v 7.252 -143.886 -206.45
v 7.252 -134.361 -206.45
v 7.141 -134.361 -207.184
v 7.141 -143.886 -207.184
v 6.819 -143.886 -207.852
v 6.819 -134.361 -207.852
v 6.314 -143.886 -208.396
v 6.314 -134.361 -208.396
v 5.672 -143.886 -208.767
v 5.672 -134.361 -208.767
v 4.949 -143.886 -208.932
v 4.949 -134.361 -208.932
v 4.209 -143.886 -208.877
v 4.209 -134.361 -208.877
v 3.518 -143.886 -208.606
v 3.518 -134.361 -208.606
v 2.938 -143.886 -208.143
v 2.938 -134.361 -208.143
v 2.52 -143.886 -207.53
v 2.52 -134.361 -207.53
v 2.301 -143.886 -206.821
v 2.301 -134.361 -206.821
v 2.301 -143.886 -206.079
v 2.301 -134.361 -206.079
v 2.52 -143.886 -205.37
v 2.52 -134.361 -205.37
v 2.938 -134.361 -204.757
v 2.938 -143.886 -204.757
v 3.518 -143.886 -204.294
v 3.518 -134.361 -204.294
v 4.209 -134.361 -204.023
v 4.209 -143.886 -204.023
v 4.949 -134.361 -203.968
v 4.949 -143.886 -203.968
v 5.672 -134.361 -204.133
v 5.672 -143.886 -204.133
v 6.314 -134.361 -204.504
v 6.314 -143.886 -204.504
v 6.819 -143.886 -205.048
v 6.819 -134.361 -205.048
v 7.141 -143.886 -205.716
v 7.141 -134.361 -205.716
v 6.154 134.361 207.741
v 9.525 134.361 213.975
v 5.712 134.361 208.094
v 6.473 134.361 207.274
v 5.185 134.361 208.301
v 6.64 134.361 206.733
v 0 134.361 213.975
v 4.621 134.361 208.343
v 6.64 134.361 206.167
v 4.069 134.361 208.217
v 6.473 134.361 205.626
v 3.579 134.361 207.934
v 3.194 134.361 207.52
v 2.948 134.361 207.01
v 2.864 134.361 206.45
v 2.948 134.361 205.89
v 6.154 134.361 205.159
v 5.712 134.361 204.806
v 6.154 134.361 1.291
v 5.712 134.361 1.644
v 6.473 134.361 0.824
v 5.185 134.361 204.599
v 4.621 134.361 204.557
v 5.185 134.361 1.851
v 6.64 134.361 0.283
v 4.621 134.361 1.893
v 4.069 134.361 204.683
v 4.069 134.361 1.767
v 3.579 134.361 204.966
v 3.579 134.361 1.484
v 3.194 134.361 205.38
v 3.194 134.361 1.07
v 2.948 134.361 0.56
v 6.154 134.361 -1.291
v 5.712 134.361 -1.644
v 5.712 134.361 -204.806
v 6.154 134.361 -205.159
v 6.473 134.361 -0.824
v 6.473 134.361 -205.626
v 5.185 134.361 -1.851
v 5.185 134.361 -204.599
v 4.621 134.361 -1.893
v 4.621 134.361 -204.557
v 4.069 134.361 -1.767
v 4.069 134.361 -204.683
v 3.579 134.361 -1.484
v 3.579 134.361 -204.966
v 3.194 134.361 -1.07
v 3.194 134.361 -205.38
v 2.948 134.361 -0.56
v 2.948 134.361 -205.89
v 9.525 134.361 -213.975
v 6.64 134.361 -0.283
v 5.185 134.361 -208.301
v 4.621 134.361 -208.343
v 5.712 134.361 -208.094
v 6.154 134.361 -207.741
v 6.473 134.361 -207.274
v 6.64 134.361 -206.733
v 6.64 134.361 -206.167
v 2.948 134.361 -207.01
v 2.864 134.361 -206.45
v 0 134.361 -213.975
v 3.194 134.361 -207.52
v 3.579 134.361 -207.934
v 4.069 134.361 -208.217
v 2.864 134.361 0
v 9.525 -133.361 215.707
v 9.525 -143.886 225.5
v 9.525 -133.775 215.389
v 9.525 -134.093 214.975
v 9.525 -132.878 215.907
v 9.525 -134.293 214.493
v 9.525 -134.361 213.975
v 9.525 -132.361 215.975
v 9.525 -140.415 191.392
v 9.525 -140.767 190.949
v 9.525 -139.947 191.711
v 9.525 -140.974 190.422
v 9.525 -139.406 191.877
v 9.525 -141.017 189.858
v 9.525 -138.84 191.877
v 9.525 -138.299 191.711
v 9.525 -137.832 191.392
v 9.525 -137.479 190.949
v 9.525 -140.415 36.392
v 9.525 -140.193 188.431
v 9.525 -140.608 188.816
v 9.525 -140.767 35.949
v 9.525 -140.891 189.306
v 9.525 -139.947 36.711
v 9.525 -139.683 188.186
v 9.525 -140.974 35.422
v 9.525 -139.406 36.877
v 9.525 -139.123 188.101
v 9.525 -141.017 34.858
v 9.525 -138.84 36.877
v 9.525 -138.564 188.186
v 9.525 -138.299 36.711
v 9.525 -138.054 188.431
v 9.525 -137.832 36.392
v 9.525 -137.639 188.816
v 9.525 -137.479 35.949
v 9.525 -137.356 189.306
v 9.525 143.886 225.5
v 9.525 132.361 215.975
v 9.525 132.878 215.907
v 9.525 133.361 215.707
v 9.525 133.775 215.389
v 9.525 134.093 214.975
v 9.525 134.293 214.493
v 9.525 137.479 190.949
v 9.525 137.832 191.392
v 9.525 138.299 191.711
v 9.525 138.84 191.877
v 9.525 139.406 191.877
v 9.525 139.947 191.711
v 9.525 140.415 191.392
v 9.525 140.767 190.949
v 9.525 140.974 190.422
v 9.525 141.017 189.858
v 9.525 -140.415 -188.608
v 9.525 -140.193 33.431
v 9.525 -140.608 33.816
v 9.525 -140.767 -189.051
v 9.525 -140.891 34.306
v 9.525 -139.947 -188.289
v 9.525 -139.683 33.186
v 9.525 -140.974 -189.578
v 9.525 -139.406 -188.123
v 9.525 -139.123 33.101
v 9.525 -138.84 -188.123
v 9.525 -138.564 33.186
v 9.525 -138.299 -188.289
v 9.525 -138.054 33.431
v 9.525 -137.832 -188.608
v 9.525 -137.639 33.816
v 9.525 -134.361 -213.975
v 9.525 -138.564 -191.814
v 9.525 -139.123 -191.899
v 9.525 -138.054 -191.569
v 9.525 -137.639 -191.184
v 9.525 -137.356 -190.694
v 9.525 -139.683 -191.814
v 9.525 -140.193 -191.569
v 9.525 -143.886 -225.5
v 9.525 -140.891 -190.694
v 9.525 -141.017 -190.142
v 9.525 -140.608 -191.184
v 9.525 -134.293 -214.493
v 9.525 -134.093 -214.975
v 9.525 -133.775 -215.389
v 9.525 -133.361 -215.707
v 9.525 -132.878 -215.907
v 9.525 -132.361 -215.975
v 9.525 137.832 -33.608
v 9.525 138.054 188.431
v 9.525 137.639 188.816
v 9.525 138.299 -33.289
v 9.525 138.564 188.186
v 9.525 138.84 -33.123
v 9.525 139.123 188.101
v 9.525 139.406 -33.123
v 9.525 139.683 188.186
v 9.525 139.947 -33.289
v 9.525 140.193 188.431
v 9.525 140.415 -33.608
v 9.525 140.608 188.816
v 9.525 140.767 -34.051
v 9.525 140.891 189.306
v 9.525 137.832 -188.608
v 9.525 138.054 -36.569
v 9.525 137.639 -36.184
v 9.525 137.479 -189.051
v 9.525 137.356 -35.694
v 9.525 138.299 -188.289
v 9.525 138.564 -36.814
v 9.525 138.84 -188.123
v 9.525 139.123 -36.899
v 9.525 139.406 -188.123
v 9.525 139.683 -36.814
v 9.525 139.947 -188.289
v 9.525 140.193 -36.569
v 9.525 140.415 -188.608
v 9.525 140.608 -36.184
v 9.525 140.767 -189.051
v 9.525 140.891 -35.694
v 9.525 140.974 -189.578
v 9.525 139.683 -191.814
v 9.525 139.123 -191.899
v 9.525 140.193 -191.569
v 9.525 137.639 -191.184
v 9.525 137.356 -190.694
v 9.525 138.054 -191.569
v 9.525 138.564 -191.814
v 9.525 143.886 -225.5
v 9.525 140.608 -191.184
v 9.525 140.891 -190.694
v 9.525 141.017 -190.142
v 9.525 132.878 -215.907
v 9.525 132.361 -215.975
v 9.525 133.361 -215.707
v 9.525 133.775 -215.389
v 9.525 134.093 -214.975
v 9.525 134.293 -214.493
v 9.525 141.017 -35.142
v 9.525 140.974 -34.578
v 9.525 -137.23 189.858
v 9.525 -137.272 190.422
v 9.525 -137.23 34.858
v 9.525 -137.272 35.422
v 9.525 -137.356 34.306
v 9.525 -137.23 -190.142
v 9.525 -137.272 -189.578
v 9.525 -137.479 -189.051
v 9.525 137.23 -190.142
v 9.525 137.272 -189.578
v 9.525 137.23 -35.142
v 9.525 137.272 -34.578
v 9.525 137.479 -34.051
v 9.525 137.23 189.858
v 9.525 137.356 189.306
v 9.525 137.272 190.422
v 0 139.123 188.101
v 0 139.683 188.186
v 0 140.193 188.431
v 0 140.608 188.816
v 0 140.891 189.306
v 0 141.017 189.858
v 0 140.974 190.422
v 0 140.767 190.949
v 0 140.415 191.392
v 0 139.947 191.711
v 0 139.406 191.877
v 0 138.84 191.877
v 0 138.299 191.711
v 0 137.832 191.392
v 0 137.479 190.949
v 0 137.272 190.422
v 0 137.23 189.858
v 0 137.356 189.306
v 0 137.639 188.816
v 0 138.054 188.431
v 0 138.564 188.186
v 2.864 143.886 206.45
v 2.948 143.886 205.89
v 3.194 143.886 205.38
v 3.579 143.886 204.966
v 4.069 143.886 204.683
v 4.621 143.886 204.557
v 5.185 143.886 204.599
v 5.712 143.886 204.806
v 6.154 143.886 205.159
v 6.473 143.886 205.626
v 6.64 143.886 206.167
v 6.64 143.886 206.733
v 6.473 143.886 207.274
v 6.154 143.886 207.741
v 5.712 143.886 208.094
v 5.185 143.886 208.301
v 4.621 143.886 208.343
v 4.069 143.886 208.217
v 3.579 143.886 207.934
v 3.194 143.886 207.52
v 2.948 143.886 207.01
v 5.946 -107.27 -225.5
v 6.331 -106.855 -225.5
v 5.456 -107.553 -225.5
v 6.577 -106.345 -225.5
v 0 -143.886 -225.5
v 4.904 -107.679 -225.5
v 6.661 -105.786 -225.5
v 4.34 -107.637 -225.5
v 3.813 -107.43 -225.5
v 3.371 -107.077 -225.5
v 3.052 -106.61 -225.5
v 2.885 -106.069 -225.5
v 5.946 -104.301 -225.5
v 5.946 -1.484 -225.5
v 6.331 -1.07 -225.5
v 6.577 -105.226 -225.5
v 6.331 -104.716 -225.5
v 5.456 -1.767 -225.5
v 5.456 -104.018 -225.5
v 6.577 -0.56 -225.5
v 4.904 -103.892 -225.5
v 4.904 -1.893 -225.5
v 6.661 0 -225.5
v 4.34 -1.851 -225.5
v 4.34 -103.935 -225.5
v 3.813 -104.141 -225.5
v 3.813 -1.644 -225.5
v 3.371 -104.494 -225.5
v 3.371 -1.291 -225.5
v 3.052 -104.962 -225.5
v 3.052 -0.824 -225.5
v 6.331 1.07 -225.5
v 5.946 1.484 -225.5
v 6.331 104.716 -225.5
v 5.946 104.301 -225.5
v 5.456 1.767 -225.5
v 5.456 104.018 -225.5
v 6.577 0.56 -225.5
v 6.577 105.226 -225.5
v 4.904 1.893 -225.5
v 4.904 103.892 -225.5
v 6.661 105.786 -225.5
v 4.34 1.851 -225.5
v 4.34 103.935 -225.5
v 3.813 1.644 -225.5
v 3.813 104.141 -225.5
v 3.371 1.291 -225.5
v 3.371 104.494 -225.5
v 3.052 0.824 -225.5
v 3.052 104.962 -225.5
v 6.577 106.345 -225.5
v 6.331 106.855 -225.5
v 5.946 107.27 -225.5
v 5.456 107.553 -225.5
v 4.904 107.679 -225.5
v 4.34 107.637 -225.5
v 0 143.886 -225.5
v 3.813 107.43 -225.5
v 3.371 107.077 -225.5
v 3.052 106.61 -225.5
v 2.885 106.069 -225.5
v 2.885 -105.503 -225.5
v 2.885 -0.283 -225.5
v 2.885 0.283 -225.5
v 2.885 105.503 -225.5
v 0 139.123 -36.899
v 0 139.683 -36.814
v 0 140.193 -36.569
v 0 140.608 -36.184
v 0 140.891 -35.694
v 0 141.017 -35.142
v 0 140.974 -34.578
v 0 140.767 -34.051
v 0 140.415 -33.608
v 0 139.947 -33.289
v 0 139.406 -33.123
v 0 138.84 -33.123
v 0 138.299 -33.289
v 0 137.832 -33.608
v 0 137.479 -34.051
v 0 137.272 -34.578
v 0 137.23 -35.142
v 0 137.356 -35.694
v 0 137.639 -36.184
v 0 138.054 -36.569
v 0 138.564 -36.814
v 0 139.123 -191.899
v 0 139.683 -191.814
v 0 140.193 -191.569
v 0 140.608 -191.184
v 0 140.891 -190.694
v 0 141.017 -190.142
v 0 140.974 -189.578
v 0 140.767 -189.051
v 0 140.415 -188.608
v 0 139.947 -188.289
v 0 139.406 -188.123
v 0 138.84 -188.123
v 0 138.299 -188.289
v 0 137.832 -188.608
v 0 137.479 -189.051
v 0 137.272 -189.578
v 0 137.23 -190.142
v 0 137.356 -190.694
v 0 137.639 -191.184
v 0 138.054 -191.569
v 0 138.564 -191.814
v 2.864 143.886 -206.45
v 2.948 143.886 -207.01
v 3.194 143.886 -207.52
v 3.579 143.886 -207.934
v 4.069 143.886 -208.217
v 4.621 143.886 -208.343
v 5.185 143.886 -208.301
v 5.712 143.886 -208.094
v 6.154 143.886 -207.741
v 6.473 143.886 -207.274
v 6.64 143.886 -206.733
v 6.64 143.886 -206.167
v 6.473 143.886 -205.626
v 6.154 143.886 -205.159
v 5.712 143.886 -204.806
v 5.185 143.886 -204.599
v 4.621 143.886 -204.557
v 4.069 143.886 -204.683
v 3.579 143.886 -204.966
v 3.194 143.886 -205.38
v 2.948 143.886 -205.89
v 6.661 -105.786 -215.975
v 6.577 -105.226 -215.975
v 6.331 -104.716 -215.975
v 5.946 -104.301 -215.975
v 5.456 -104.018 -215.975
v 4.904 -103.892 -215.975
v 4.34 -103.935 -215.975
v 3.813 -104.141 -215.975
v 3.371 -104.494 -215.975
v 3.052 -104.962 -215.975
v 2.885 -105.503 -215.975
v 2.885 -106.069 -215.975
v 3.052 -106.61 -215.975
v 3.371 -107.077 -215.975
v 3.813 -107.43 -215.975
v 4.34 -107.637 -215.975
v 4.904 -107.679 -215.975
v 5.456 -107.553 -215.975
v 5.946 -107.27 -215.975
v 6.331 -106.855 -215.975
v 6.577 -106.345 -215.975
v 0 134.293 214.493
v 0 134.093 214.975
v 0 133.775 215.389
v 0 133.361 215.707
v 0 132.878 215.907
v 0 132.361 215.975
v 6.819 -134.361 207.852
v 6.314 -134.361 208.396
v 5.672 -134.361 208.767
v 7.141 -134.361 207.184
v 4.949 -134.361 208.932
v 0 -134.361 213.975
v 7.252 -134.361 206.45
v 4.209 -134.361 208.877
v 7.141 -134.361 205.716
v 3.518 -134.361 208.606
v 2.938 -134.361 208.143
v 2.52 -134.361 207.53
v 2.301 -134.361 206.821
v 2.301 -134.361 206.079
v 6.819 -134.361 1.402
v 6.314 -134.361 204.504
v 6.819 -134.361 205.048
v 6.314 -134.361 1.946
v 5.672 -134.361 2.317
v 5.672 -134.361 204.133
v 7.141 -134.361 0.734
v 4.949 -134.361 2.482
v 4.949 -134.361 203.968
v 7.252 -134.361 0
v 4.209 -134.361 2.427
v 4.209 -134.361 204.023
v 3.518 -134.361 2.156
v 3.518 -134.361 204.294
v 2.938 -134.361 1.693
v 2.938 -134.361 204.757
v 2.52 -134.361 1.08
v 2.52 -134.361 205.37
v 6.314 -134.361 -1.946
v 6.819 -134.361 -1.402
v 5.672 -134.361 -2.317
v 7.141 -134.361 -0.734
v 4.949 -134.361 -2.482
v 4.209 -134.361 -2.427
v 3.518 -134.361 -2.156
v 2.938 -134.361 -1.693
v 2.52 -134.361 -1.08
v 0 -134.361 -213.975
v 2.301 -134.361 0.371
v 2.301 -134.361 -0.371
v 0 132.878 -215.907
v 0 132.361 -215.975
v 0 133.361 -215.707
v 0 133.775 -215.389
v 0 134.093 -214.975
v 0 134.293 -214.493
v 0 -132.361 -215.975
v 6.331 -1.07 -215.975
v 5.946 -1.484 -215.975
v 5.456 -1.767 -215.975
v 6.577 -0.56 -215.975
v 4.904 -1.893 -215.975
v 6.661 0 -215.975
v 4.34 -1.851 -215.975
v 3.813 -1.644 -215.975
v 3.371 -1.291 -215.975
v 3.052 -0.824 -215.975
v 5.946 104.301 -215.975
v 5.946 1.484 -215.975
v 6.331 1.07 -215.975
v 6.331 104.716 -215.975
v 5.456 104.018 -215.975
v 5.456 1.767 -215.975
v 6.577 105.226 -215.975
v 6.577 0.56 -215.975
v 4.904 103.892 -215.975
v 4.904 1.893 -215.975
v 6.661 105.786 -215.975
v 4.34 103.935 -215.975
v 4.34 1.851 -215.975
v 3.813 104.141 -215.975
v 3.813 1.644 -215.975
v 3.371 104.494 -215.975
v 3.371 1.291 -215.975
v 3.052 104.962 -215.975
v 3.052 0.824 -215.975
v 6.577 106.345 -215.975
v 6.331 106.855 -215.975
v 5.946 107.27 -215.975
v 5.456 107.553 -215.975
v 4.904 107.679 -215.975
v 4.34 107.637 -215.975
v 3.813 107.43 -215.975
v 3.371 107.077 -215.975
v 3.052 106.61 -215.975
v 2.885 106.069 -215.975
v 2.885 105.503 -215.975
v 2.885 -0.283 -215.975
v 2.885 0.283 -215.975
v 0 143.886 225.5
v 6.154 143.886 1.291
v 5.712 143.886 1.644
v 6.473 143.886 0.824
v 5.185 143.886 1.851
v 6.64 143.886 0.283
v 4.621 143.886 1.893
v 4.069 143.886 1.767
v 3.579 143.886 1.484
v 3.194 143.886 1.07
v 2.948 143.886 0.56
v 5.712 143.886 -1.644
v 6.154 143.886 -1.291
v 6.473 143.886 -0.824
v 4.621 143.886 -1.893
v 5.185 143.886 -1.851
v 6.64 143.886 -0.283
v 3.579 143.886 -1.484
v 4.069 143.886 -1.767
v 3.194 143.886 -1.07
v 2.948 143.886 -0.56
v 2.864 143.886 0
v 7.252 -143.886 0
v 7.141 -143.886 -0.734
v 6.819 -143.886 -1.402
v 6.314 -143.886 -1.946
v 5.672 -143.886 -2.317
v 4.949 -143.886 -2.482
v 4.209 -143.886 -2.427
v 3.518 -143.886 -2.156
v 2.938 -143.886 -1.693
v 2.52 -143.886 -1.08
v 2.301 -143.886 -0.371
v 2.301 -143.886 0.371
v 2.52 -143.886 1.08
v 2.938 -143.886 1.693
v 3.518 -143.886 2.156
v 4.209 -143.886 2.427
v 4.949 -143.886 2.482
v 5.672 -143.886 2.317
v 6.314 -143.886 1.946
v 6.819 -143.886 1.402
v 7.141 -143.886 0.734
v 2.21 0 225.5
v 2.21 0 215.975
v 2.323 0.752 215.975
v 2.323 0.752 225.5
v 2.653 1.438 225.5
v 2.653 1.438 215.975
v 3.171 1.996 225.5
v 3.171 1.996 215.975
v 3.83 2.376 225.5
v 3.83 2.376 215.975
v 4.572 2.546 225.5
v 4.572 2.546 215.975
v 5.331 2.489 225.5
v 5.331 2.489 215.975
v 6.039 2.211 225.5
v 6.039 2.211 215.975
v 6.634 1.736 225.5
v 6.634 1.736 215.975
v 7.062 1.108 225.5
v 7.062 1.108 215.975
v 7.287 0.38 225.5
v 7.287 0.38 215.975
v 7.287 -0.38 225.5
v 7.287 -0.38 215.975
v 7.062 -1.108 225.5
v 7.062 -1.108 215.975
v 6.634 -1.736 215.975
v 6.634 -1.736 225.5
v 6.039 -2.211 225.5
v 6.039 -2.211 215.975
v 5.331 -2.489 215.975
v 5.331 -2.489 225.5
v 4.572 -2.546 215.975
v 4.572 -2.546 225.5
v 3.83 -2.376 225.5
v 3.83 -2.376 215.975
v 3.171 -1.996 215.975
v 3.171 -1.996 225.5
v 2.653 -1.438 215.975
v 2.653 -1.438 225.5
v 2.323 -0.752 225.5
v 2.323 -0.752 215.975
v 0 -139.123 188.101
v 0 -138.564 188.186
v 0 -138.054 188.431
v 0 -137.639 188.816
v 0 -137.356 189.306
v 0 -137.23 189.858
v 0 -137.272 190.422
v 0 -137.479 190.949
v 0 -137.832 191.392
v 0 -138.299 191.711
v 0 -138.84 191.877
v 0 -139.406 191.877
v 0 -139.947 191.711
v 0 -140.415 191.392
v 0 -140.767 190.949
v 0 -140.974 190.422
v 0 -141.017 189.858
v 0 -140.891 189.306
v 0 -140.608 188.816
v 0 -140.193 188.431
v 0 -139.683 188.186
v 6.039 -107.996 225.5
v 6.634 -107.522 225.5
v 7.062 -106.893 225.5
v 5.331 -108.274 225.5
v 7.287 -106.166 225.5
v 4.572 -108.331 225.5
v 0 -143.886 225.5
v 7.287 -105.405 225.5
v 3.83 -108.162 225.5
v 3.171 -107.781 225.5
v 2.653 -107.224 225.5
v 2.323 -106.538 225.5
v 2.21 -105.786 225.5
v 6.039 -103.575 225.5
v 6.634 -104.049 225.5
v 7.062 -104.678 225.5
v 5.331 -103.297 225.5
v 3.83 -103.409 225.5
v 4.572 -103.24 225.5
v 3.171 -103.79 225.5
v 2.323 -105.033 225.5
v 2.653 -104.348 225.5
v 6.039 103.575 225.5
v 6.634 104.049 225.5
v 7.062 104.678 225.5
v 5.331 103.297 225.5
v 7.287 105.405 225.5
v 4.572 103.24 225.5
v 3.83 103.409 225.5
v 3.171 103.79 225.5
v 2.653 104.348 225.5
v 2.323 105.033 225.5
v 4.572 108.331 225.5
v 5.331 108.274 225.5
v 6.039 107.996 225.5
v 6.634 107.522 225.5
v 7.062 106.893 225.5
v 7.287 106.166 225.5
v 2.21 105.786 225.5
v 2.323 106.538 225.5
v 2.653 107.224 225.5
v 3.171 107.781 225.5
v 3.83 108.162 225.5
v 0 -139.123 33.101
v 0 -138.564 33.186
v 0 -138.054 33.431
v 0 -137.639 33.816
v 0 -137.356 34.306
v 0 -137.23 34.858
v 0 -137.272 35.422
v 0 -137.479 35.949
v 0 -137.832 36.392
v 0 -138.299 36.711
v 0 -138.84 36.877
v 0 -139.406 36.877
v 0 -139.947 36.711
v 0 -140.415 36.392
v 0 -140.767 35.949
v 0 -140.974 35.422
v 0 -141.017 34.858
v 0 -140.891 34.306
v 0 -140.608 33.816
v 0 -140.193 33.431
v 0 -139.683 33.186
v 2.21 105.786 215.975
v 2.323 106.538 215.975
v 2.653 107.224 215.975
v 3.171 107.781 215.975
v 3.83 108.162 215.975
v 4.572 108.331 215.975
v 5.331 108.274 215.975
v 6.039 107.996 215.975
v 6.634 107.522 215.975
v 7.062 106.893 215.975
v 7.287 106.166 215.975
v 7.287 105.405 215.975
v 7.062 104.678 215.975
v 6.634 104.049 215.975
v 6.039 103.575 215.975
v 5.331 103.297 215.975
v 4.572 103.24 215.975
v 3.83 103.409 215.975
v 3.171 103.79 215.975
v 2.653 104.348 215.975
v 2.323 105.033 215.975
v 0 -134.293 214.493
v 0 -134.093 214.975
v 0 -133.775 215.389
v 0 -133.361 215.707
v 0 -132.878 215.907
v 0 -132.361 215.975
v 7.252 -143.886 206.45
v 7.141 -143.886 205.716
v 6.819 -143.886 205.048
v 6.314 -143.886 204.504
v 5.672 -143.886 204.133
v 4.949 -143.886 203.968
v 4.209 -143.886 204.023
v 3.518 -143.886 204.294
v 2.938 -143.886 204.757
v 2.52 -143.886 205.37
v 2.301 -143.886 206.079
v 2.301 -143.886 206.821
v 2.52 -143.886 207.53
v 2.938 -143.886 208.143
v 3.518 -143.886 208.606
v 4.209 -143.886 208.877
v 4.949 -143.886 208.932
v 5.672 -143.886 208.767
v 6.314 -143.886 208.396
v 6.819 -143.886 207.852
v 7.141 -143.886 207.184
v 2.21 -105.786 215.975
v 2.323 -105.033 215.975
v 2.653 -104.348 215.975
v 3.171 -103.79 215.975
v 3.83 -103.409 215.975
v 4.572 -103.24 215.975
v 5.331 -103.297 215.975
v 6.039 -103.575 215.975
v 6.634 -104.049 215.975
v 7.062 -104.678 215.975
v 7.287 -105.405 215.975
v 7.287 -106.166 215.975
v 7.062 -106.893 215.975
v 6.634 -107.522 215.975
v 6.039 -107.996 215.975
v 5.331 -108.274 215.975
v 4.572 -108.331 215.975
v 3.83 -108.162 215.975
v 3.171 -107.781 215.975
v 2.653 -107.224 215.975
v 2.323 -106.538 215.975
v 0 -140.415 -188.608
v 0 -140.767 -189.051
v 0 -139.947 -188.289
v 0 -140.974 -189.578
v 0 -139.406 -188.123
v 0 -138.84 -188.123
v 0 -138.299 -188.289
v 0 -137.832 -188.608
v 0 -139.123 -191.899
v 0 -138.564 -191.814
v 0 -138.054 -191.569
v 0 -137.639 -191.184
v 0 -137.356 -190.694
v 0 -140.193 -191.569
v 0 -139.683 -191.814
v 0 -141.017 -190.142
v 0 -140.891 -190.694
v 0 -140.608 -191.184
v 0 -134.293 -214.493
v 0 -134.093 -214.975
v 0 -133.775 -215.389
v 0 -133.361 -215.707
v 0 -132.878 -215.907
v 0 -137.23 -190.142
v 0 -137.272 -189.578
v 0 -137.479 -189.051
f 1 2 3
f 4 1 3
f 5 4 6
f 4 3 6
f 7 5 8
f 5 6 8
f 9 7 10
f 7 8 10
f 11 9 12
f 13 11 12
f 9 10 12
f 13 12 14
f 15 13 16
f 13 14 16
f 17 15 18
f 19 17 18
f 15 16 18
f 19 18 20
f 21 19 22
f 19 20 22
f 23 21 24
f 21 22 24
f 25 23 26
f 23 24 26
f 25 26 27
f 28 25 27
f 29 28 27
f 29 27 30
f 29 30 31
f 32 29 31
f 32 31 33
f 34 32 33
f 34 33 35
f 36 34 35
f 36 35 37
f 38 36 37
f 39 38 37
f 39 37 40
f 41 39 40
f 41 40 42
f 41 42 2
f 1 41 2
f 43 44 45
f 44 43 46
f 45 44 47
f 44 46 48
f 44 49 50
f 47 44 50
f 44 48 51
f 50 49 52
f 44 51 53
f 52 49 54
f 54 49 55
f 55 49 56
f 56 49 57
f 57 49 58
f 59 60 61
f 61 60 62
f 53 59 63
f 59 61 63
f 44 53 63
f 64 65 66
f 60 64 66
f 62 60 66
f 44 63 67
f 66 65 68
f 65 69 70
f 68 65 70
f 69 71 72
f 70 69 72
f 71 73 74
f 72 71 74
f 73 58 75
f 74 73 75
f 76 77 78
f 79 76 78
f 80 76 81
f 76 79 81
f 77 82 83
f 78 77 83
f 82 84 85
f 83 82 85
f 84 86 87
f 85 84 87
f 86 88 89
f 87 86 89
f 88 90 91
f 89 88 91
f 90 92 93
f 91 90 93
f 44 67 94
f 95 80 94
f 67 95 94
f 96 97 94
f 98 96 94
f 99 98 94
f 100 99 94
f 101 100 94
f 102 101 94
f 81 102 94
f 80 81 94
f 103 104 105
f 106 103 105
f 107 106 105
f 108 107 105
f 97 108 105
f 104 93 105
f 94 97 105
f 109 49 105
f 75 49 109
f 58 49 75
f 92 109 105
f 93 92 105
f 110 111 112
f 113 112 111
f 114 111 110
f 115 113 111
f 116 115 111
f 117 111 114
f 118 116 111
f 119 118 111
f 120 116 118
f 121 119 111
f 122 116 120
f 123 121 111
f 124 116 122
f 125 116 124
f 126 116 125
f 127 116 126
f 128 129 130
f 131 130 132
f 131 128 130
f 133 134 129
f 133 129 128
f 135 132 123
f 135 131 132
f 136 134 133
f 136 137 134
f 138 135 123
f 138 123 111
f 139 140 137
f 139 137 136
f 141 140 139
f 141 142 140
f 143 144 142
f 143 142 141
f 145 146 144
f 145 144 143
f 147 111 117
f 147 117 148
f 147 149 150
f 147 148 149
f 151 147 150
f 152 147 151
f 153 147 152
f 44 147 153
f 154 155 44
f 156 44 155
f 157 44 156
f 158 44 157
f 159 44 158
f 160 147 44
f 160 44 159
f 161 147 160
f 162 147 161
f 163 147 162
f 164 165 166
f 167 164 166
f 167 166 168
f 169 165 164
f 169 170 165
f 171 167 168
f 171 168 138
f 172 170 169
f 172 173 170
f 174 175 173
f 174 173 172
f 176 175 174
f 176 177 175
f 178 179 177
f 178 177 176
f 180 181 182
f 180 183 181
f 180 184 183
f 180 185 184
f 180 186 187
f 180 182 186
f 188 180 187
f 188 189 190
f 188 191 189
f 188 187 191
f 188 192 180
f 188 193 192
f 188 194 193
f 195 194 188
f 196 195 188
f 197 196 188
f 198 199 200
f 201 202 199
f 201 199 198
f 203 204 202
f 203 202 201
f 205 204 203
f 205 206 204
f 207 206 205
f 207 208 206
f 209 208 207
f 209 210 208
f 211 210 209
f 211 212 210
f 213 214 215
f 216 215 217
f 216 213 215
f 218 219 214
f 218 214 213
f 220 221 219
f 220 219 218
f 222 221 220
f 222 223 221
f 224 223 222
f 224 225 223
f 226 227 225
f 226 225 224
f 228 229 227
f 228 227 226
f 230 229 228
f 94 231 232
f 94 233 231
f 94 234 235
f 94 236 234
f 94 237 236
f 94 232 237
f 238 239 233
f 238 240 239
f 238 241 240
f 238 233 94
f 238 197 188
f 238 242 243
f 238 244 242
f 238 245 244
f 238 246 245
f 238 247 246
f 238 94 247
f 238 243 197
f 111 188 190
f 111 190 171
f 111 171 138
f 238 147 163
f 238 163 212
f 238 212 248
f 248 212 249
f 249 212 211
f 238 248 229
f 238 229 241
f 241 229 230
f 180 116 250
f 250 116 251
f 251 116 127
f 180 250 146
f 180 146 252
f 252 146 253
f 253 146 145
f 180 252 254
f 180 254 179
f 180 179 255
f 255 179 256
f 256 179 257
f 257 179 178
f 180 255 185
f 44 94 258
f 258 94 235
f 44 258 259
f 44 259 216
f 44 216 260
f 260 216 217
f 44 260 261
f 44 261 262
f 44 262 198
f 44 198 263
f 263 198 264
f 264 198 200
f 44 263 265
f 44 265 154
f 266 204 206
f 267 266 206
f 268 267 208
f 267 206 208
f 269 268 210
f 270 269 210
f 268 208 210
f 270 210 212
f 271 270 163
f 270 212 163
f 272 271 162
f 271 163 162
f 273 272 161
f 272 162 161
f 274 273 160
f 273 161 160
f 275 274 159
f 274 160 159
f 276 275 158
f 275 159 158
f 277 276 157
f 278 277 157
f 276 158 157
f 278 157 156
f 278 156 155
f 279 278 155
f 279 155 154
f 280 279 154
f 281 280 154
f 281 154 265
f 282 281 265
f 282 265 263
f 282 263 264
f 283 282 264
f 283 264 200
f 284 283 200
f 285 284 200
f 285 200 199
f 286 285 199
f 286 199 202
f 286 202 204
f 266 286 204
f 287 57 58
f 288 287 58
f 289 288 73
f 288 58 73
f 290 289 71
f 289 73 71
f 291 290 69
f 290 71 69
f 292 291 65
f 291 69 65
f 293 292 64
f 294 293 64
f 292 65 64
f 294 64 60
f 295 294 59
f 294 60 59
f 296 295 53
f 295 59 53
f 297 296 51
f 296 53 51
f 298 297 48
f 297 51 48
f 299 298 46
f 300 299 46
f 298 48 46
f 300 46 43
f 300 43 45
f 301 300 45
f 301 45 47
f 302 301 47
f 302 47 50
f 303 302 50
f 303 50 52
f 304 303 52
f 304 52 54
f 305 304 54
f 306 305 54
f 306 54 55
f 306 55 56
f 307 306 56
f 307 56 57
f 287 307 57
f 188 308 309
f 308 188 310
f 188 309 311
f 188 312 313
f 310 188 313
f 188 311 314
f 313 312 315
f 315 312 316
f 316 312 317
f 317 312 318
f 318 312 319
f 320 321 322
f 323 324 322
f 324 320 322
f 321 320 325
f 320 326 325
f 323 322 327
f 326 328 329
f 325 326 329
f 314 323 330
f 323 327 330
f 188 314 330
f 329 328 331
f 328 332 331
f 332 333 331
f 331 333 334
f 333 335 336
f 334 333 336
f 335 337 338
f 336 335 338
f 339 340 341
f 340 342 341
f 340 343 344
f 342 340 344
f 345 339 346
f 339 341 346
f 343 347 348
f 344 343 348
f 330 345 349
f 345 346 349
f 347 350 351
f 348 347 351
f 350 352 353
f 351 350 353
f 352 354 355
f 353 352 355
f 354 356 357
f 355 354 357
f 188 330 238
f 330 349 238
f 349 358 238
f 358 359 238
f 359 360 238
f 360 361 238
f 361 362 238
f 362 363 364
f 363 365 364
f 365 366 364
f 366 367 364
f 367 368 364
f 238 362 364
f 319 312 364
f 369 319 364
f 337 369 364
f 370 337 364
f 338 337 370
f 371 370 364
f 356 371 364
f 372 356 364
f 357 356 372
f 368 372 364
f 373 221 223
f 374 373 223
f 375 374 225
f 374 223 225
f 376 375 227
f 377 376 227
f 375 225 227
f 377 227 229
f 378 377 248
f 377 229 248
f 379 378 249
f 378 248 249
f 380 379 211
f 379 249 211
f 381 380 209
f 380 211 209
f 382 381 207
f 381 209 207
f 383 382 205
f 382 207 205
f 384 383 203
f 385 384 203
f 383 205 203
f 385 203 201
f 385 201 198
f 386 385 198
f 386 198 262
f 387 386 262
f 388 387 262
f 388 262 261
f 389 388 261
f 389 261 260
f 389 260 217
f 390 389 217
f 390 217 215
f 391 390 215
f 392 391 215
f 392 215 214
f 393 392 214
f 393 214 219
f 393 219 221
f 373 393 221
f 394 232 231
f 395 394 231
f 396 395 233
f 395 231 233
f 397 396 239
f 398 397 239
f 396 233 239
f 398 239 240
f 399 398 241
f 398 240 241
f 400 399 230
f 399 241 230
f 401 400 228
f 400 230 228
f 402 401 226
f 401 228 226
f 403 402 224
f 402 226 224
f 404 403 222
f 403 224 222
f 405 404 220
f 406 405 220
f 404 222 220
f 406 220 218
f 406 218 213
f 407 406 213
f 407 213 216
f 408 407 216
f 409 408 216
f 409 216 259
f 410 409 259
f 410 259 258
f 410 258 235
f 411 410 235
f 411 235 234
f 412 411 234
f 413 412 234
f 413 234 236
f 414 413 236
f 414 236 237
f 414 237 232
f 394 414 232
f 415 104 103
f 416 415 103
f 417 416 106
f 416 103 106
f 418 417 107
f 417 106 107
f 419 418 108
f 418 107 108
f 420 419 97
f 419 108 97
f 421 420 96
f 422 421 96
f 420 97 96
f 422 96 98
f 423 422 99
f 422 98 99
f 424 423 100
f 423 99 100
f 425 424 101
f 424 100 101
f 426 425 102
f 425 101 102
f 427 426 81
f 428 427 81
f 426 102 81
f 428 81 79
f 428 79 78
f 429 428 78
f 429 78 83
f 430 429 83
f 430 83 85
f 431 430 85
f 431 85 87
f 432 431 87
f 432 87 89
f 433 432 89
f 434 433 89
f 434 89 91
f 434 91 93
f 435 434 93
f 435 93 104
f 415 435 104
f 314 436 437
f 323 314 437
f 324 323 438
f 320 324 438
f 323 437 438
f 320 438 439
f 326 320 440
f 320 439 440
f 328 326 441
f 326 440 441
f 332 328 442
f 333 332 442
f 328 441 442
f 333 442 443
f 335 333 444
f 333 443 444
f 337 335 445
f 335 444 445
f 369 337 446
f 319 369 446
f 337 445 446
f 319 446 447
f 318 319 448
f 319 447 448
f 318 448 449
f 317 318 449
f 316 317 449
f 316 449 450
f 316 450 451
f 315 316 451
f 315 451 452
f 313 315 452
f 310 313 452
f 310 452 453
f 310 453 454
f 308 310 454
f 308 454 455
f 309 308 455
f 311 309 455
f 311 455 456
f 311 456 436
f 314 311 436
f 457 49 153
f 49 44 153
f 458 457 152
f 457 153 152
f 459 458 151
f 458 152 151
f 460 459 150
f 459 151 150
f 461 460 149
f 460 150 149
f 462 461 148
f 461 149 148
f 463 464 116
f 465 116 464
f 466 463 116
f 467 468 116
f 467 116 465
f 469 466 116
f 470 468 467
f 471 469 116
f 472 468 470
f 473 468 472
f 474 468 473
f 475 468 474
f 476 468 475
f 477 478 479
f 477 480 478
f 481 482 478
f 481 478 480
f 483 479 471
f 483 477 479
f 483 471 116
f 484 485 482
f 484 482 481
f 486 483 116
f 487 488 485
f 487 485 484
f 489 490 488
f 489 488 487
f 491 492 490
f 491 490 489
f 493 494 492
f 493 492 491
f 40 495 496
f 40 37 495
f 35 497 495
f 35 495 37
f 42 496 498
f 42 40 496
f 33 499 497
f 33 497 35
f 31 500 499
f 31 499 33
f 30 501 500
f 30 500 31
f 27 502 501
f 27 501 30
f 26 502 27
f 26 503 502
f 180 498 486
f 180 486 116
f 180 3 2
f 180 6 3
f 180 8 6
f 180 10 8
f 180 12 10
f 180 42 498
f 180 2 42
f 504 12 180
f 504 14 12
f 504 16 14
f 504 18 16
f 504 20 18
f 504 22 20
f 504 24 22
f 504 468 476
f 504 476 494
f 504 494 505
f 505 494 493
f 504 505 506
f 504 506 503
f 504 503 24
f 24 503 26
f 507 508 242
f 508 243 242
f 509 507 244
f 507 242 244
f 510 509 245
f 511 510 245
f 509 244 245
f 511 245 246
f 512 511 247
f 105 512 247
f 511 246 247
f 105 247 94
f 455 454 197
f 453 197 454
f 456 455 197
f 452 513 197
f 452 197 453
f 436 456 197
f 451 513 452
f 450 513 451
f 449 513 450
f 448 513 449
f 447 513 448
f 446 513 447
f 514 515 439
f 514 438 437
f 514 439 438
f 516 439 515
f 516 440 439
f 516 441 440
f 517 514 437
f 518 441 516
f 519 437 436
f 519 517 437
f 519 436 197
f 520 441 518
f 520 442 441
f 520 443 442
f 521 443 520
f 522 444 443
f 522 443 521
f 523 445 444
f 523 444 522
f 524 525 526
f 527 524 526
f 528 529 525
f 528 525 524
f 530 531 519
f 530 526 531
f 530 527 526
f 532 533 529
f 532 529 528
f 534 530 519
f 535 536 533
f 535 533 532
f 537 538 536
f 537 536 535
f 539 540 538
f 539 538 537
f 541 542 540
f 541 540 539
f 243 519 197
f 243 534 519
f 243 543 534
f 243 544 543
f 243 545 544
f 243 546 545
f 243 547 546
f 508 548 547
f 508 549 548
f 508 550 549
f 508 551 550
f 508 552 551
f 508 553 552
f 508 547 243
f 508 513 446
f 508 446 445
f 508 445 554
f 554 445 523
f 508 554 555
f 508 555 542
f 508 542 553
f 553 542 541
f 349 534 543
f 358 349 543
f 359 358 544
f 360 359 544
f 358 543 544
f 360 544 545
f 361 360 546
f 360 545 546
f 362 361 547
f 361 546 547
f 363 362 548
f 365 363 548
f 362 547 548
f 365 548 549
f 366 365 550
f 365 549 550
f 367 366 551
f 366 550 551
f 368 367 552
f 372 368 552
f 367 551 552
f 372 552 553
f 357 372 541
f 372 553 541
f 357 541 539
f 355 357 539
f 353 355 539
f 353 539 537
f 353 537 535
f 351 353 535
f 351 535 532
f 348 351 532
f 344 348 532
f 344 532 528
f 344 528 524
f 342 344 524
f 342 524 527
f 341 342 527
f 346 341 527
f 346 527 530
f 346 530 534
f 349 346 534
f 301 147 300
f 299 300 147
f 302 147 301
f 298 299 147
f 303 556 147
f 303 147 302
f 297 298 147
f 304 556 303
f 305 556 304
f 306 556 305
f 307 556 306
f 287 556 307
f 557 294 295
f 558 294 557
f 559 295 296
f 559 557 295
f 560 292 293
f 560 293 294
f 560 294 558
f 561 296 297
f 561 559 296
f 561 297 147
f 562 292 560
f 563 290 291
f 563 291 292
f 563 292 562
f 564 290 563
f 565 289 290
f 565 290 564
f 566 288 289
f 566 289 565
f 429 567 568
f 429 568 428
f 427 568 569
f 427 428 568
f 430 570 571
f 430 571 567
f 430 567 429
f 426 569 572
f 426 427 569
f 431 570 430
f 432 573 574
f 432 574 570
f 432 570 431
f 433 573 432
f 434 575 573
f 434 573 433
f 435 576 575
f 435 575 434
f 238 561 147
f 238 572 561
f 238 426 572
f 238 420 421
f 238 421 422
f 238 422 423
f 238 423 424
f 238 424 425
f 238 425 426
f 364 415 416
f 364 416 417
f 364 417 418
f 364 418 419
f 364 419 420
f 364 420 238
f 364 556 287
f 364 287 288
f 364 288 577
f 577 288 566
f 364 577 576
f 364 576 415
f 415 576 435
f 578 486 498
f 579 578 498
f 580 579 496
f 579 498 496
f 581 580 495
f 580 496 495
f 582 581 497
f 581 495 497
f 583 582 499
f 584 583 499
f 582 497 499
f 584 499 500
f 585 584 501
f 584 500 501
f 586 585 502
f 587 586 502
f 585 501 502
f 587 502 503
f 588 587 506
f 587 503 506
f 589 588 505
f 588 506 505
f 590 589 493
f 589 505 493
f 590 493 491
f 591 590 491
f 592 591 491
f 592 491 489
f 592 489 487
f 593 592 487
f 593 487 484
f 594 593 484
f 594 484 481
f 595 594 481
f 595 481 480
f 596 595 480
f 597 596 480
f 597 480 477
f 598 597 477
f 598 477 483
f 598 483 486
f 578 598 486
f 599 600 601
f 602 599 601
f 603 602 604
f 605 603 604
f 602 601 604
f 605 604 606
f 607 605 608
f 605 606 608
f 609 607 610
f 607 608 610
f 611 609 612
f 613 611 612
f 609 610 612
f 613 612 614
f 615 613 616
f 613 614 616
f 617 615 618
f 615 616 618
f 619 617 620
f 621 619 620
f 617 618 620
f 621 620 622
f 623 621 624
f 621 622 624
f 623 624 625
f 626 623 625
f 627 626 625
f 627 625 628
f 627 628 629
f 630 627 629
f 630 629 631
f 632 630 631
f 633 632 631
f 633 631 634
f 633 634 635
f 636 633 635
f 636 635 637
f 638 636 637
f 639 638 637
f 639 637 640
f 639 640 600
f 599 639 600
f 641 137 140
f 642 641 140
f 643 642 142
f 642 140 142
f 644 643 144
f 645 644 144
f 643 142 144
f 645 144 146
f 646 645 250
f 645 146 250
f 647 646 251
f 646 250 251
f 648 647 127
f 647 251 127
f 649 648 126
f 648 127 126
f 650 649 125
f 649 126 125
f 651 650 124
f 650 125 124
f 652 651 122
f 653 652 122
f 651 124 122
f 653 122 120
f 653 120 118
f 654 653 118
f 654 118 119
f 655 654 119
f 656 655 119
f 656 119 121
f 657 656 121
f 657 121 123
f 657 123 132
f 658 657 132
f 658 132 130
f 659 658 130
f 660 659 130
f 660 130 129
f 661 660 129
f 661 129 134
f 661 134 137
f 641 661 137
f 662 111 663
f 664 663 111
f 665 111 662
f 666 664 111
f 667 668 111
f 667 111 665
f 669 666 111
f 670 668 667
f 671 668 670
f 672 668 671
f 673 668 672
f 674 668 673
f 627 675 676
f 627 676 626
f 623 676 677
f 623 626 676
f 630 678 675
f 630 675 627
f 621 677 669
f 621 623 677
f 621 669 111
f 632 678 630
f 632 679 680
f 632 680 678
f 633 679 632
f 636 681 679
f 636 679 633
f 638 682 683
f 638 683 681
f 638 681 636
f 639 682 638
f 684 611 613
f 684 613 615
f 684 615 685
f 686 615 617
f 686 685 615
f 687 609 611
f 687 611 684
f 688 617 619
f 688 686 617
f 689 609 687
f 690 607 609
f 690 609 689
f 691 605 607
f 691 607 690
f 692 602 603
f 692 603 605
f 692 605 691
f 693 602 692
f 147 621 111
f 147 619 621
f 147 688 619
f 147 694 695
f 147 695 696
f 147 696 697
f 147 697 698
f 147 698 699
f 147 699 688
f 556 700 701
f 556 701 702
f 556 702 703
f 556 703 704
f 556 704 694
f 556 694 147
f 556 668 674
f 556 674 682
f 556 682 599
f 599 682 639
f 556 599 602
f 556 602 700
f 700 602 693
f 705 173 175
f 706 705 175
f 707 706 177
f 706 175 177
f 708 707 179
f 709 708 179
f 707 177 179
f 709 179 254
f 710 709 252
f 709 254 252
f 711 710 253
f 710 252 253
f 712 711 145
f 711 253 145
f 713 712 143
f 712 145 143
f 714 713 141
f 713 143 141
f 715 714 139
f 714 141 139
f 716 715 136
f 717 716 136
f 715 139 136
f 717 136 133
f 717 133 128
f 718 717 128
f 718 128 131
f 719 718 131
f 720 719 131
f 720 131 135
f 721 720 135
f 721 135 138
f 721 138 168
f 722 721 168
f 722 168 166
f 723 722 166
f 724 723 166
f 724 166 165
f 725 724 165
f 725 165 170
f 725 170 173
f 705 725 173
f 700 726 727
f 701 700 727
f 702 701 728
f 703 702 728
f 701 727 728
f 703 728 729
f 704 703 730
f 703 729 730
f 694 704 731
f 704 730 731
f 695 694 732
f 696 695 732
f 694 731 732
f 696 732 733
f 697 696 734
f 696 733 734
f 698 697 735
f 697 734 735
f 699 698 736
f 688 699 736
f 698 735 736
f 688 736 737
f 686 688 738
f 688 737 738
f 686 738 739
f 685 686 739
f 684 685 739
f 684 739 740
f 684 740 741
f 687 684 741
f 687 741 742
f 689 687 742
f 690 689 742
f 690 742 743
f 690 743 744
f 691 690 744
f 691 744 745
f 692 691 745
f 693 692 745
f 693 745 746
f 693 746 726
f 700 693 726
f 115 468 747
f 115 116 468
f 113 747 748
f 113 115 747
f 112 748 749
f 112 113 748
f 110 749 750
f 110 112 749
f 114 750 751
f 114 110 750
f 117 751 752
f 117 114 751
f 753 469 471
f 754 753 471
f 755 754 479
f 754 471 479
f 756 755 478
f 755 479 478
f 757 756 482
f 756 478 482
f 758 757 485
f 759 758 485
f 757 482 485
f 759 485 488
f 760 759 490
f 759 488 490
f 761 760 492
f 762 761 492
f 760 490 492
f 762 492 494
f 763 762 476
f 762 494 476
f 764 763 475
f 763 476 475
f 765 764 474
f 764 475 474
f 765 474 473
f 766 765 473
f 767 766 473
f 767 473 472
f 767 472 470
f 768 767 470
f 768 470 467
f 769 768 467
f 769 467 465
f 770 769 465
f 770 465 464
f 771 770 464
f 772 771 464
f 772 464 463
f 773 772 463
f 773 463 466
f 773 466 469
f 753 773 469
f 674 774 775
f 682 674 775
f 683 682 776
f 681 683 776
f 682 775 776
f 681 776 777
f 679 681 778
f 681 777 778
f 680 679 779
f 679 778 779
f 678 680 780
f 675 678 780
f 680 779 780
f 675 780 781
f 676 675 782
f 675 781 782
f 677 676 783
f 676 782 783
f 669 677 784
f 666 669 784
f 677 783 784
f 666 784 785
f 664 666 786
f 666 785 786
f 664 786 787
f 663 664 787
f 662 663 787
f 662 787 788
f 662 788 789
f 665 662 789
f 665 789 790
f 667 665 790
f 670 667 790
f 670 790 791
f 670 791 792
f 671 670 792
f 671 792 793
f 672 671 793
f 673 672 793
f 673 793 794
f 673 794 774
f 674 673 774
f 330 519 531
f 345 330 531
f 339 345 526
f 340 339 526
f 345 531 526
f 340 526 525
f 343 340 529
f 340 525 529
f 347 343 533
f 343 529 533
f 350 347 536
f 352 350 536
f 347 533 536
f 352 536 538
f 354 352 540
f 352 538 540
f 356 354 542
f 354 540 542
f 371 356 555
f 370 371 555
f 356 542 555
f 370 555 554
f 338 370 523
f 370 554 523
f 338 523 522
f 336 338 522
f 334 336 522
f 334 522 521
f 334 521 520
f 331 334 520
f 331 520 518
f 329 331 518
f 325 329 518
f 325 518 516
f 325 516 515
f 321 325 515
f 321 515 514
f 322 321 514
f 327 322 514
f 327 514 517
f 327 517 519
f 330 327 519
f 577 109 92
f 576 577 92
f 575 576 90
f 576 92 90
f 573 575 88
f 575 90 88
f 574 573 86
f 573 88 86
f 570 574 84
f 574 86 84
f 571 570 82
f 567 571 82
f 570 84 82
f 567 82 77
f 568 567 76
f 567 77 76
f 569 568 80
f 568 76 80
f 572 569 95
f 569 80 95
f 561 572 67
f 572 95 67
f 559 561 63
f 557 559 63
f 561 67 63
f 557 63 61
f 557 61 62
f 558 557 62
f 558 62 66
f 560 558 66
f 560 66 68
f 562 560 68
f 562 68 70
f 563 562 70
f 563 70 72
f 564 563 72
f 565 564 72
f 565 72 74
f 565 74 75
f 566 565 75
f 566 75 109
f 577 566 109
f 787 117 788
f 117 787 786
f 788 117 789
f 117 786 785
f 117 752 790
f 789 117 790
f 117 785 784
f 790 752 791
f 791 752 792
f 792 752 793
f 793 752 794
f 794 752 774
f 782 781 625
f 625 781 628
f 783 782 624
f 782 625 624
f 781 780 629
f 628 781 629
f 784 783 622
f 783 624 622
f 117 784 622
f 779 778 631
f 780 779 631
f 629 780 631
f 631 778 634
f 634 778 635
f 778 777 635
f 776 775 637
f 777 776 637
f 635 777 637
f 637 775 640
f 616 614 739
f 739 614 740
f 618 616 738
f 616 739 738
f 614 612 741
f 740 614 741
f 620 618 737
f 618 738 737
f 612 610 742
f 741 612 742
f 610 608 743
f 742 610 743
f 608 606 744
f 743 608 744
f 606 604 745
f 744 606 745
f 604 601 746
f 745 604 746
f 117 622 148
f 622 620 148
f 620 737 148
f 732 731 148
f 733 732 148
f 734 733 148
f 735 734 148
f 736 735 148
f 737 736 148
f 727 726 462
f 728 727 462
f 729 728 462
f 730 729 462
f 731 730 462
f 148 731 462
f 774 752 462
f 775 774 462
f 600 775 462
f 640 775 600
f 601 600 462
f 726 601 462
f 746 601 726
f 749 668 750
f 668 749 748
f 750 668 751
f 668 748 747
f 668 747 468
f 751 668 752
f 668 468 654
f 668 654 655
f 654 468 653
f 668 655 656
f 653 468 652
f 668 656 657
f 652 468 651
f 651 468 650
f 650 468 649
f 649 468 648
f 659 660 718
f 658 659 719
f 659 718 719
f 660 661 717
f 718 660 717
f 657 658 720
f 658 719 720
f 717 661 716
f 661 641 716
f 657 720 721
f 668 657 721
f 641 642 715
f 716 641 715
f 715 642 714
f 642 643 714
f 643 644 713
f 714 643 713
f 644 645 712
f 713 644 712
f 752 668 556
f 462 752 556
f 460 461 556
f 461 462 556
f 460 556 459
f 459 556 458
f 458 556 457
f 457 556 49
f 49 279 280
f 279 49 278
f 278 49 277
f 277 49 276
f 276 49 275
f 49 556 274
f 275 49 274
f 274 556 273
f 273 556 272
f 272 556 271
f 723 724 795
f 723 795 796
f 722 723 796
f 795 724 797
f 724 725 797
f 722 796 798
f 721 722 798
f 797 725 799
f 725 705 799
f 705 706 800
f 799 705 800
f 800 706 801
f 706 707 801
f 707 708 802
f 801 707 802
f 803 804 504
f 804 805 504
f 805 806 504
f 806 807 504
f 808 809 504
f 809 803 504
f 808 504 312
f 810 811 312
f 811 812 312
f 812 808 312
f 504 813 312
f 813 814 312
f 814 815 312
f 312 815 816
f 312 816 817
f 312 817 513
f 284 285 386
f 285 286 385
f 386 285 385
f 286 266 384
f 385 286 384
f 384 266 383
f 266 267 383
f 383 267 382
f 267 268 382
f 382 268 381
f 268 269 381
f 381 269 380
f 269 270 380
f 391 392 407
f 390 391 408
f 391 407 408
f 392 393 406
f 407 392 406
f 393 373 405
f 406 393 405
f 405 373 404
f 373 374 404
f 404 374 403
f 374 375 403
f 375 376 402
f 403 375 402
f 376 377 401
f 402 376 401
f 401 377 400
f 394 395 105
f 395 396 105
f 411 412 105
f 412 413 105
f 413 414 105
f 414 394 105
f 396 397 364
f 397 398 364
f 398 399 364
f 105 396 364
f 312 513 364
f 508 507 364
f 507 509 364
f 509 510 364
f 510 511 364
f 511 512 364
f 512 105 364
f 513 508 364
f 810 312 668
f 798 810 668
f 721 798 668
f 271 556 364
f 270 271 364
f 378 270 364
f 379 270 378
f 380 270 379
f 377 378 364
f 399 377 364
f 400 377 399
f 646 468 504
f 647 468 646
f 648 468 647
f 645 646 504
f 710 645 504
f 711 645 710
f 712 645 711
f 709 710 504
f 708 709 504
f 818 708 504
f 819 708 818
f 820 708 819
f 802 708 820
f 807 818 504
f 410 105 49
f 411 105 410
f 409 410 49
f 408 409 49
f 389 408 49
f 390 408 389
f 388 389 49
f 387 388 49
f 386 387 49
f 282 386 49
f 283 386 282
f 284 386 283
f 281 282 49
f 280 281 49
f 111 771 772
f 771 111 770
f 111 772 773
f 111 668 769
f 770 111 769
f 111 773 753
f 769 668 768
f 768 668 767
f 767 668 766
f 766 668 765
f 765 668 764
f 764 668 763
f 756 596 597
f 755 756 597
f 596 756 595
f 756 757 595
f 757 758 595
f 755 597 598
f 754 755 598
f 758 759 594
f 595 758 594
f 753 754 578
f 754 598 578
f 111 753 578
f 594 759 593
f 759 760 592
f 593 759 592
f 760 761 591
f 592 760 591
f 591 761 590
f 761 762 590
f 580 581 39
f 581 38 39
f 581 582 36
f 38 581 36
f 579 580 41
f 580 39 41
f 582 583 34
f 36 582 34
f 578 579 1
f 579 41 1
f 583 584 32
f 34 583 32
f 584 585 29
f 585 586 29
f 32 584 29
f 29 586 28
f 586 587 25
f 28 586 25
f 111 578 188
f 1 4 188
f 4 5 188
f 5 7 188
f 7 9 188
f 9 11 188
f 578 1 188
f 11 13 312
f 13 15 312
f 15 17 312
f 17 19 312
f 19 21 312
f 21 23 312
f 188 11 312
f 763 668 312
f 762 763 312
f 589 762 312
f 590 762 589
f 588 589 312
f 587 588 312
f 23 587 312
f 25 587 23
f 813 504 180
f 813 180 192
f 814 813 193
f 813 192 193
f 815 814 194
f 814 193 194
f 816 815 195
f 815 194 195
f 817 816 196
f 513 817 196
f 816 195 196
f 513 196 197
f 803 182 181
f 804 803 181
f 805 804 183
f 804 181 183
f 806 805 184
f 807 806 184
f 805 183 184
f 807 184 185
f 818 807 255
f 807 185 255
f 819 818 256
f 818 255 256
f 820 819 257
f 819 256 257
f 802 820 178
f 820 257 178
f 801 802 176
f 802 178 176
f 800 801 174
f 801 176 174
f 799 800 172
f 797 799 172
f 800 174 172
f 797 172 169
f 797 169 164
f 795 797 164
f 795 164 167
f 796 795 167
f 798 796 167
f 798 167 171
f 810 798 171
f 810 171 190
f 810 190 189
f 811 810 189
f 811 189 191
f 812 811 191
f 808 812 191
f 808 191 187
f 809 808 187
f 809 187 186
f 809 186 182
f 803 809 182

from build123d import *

# Parameters (mm, degrees)
SKETCH1_W                   = 451
SKETCH1_H                   = 287.7714167
SKETCH1_W_2                 = 431.95
SKETCH1_H_2                 = 268.7214167
EXTRUDE_THIN1_DEPTH         = 9.525
FILLET1_R                   = 2
F_10_CLEARANCE_HOLE1_D      = 4.9784
F_10_CLEARANCE_HOLE1_DEPTH  = 9.525
F_10_24_TAPPED_HOLE1_D      = 3.7973
F_10_24_TAPPED_HOLE1_DEPTH  = 14.95
F_10_24_TAPPED_HOLE1_TIP    = 1.140824014
F_10_CLEARANCE_HOLE2_D      = 5.1054
F_10_CLEARANCE_HOLE2_DEPTH  = 20
F_10_CLEARANCE_HOLE2_TIP    = 1.533816902
F_10_24_TAPPED_HOLE2_SIDE_D = 3.7973
F_10_24_TAPPED_HOLE2_D      = 3.7973
F_10_24_TAPPED_HOLE2_DEPTH  = 14.95
F_10_24_TAPPED_HOLE2_TIP    = 1.140824014


with BuildPart() as part:
    # Sketch1 → Extrude-Thin1 (new body)
    with BuildSketch(Plane(origin=(0, 0, 0), x_dir=(0, 0, -1), z_dir=(1, 0, 0))):
        Rectangle(SKETCH1_W, SKETCH1_H)
        Rectangle(SKETCH1_W_2, SKETCH1_H_2, mode=Mode.SUBTRACT)
    extrude(amount=EXTRUDE_THIN1_DEPTH)

    # Fillet1
    fillet1_edges = [part.edges().sort_by_distance(p)[0] for p in [
        (4.7625, 134.36070835, 215.975),
        (4.7625, -134.36070835, 215.975),
        (4.7625, -134.36070835, -215.975),
        (4.7625, 134.36070835, -215.975),
    ]]
    fillet(fillet1_edges, radius=FILLET1_R)

    # #10 Clearance Hole1
    with Locations(Plane(origin=(0, -143.88570835, 0), x_dir=(-1, 0, 0), z_dir=(0, -1, 0))):
        with Locations((-4.7625, 206.45), (-4.7625, 0), (-4.7625, -206.45)):
            Hole(F_10_CLEARANCE_HOLE1_D / 2, depth=F_10_CLEARANCE_HOLE1_DEPTH)

    # #10-24 Tapped Hole1
    with Locations(Plane(origin=(0, 0, -225.5), x_dir=(-1, 0, 0), z_dir=(0, 0, -1))):
        with Locations((-4.7625, 105.78570835), (-4.7625, 0), (-4.7625, -105.78570835)):
            Hole(F_10_24_TAPPED_HOLE1_D / 2, depth=F_10_24_TAPPED_HOLE1_DEPTH)
            with Locations((0, 0, -(F_10_24_TAPPED_HOLE1_DEPTH + F_10_24_TAPPED_HOLE1_TIP / 2))):  # 118° drill point
                Cone(0, F_10_24_TAPPED_HOLE1_D / 2, F_10_24_TAPPED_HOLE1_TIP, mode=Mode.SUBTRACT)

    # #10 Clearance Hole2
    with Locations(Plane.XY.offset(225.5)):
        with Locations((4.7625, 105.78570835), (4.7625, 0), (4.7625, -105.78570835)):
            Hole(F_10_CLEARANCE_HOLE2_D / 2, depth=F_10_CLEARANCE_HOLE2_DEPTH)
            with Locations((0, 0, -(F_10_CLEARANCE_HOLE2_DEPTH + F_10_CLEARANCE_HOLE2_TIP / 2))):  # 118° drill point
                Cone(0, F_10_CLEARANCE_HOLE2_D / 2, F_10_CLEARANCE_HOLE2_TIP, mode=Mode.SUBTRACT)

    # #10-24 Tapped Hole2 side (through all)
    with Locations(Plane.ZY):
        with Locations((-190, 139.12320835), (-35, 139.12320835), (-190, -139.12320835), (35, -139.12320835), (190, -139.12320835), (190, 139.12320835)):
            Hole(F_10_24_TAPPED_HOLE2_SIDE_D / 2)

    # #10-24 Tapped Hole2
    with Locations(Plane(origin=(0, 143.88570835, 0), x_dir=(1, 0, 0), z_dir=(0, 1, 0))):
        with Locations((4.7625, 206.45), (4.7625, 0), (4.7625, -206.45)):
            Hole(F_10_24_TAPPED_HOLE2_D / 2, depth=F_10_24_TAPPED_HOLE2_DEPTH)
            with Locations((0, 0, -(F_10_24_TAPPED_HOLE2_DEPTH + F_10_24_TAPPED_HOLE2_TIP / 2))):  # 118° drill point
                Cone(0, F_10_24_TAPPED_HOLE2_D / 2, F_10_24_TAPPED_HOLE2_TIP, mode=Mode.SUBTRACT)


solid = part.part
